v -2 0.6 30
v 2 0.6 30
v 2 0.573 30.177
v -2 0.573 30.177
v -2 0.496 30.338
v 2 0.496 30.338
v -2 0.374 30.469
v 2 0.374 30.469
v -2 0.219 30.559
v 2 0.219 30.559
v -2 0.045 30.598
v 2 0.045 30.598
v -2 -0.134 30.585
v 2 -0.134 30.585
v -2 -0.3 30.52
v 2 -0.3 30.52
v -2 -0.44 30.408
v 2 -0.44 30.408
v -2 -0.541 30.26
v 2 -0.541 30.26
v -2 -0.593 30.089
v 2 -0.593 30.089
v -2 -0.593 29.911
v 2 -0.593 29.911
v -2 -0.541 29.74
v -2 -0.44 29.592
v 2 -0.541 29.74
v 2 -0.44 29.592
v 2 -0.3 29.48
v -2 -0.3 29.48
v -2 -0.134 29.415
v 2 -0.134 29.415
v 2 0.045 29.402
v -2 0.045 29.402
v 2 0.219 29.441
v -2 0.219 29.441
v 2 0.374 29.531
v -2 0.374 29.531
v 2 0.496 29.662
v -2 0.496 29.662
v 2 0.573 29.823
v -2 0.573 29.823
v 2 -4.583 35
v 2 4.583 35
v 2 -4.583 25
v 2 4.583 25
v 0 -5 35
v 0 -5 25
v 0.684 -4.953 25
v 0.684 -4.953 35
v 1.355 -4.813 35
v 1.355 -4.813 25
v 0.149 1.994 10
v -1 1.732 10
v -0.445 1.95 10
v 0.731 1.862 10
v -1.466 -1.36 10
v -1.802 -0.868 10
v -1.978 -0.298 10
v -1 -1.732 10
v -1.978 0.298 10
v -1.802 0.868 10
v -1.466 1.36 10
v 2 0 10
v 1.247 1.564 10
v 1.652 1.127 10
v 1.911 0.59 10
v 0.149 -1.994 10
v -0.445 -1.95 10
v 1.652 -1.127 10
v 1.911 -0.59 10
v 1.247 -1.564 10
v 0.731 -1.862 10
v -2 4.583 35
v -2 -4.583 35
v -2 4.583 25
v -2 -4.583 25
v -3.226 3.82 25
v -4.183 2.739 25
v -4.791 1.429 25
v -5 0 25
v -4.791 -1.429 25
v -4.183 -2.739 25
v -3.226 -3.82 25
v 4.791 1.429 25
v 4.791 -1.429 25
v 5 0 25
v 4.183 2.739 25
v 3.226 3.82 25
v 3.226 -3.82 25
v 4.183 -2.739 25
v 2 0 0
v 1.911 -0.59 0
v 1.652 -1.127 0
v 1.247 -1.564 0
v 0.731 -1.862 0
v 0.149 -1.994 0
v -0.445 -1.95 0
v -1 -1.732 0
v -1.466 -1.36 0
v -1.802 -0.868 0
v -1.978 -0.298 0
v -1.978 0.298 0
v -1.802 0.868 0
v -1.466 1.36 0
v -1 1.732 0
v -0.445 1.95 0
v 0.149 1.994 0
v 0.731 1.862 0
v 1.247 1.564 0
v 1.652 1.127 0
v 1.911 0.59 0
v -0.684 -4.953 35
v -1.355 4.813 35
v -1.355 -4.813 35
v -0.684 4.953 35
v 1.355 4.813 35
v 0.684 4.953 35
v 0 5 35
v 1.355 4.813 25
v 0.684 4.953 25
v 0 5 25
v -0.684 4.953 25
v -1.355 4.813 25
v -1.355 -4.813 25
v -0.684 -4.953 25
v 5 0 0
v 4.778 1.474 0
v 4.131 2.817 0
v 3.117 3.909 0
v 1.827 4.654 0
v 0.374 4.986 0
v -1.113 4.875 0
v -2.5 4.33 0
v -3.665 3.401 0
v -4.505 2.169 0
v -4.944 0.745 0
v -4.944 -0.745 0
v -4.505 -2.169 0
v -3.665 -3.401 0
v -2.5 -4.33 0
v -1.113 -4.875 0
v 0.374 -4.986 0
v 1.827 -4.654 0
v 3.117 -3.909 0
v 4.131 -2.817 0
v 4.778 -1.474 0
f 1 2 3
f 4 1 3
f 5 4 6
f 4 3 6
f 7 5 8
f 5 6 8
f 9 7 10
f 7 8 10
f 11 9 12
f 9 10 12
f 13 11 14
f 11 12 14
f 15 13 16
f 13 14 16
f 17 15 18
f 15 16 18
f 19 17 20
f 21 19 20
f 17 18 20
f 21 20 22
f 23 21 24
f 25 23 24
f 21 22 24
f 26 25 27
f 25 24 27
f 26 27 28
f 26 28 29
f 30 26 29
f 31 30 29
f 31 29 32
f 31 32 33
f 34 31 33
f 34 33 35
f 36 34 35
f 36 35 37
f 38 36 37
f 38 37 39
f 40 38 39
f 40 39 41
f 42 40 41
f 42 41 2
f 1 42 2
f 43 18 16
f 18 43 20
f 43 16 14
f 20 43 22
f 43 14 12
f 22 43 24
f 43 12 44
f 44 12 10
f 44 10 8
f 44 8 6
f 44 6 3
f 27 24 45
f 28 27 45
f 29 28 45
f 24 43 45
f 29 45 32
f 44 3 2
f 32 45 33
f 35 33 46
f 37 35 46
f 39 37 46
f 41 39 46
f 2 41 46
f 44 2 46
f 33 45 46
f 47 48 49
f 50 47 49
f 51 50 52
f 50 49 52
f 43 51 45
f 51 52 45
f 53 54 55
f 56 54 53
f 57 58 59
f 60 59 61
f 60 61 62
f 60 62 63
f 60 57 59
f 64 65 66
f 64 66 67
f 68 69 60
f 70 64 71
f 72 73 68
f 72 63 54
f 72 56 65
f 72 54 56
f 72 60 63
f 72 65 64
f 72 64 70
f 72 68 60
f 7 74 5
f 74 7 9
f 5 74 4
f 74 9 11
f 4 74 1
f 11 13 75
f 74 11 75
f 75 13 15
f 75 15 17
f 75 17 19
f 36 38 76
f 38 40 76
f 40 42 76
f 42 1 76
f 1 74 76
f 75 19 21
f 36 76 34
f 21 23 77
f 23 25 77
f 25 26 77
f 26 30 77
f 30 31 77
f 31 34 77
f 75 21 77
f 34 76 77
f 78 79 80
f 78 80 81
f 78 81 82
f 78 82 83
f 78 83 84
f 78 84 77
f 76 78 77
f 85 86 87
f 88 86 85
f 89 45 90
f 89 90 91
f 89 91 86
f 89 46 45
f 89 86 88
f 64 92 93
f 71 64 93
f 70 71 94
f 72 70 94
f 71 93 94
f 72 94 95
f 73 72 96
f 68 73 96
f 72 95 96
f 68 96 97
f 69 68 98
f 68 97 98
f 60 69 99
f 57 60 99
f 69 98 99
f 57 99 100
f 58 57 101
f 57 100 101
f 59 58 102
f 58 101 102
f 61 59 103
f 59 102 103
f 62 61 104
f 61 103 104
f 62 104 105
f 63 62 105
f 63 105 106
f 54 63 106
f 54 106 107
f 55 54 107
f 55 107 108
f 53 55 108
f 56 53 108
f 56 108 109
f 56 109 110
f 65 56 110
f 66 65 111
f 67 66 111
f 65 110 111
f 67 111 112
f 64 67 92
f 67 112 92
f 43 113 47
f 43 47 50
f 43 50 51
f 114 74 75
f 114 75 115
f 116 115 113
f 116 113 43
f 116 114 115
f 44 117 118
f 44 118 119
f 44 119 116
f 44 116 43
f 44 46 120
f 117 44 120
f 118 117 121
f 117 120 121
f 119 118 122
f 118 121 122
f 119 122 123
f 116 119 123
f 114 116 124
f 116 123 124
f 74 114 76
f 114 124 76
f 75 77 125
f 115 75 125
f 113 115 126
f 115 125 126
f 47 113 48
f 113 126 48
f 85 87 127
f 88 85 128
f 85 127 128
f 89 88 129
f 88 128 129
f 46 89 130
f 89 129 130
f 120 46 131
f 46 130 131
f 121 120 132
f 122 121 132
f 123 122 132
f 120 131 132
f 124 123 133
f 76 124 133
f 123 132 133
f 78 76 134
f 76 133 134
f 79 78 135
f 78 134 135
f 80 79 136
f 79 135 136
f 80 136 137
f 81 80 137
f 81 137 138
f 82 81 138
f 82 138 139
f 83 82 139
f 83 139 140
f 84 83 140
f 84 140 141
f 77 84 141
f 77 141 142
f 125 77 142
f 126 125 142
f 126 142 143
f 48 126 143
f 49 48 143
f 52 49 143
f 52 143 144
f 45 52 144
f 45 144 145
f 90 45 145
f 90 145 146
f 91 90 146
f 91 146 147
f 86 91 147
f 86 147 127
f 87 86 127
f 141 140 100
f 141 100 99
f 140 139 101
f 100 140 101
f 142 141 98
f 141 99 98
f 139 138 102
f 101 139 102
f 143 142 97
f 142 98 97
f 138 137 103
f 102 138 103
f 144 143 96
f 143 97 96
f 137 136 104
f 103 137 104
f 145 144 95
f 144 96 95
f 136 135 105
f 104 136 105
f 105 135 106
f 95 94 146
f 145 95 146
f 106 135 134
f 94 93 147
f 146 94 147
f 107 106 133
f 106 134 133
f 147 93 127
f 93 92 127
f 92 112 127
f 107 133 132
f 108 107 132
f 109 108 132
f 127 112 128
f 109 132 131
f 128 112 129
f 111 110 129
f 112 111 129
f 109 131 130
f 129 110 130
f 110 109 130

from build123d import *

# Parameters (mm, degrees)
F0_R     = 5
F1_DEPTH = 25
F2_R     = 2
F3_DEPTH = 10
F5_DEPTH = 10
F7_D     = 1.2


with BuildPart() as f1:
    # F0 (on Top) → F1 (new body)
    with BuildSketch(Plane.XY):
        Circle(F0_R)
    extrude(amount=F1_DEPTH)

    # F2 (on face) → F3 (cut)
    with BuildSketch(Plane(origin=(0, 0, 0), x_dir=(1, 0, 0), z_dir=(0, 0, -1))):
        Circle(F2_R)
    extrude(amount=-F3_DEPTH, mode=Mode.SUBTRACT)

    # F4 (on face) → F5 (join)
    with BuildSketch(Plane.XY.offset(25)):
        with BuildLine():
            ThreePointArc((2, 4.582575695), (1.0215482184, 4.8945315647), (0, 5))
            ThreePointArc((0, 5), (-1.0216339401, 4.8945136727), (-2.0001605153, 4.582505637))
            Line((-2.0001605153, 4.582505637), (-2.0001605153, -4.582505637))
            ThreePointArc((-2.0001605153, -4.582505637), (-1.0216339401, -4.8945136727), (0, -5))
            ThreePointArc((0, -5), (1.0215482184, -4.8945315647), (2, -4.582575695))
            Line((2, -4.582575695), (2, 4.582575695))
        make_face()
    extrude(amount=F5_DEPTH)

    # F7 (through all)
    with Locations(Plane(origin=(-2.0001605153, 0, 0), x_dir=(0, -1, 0), z_dir=(-1, 0, 0))):
        with Locations((0, 30)):
            Hole(F7_D / 2)


solid = f1.part
